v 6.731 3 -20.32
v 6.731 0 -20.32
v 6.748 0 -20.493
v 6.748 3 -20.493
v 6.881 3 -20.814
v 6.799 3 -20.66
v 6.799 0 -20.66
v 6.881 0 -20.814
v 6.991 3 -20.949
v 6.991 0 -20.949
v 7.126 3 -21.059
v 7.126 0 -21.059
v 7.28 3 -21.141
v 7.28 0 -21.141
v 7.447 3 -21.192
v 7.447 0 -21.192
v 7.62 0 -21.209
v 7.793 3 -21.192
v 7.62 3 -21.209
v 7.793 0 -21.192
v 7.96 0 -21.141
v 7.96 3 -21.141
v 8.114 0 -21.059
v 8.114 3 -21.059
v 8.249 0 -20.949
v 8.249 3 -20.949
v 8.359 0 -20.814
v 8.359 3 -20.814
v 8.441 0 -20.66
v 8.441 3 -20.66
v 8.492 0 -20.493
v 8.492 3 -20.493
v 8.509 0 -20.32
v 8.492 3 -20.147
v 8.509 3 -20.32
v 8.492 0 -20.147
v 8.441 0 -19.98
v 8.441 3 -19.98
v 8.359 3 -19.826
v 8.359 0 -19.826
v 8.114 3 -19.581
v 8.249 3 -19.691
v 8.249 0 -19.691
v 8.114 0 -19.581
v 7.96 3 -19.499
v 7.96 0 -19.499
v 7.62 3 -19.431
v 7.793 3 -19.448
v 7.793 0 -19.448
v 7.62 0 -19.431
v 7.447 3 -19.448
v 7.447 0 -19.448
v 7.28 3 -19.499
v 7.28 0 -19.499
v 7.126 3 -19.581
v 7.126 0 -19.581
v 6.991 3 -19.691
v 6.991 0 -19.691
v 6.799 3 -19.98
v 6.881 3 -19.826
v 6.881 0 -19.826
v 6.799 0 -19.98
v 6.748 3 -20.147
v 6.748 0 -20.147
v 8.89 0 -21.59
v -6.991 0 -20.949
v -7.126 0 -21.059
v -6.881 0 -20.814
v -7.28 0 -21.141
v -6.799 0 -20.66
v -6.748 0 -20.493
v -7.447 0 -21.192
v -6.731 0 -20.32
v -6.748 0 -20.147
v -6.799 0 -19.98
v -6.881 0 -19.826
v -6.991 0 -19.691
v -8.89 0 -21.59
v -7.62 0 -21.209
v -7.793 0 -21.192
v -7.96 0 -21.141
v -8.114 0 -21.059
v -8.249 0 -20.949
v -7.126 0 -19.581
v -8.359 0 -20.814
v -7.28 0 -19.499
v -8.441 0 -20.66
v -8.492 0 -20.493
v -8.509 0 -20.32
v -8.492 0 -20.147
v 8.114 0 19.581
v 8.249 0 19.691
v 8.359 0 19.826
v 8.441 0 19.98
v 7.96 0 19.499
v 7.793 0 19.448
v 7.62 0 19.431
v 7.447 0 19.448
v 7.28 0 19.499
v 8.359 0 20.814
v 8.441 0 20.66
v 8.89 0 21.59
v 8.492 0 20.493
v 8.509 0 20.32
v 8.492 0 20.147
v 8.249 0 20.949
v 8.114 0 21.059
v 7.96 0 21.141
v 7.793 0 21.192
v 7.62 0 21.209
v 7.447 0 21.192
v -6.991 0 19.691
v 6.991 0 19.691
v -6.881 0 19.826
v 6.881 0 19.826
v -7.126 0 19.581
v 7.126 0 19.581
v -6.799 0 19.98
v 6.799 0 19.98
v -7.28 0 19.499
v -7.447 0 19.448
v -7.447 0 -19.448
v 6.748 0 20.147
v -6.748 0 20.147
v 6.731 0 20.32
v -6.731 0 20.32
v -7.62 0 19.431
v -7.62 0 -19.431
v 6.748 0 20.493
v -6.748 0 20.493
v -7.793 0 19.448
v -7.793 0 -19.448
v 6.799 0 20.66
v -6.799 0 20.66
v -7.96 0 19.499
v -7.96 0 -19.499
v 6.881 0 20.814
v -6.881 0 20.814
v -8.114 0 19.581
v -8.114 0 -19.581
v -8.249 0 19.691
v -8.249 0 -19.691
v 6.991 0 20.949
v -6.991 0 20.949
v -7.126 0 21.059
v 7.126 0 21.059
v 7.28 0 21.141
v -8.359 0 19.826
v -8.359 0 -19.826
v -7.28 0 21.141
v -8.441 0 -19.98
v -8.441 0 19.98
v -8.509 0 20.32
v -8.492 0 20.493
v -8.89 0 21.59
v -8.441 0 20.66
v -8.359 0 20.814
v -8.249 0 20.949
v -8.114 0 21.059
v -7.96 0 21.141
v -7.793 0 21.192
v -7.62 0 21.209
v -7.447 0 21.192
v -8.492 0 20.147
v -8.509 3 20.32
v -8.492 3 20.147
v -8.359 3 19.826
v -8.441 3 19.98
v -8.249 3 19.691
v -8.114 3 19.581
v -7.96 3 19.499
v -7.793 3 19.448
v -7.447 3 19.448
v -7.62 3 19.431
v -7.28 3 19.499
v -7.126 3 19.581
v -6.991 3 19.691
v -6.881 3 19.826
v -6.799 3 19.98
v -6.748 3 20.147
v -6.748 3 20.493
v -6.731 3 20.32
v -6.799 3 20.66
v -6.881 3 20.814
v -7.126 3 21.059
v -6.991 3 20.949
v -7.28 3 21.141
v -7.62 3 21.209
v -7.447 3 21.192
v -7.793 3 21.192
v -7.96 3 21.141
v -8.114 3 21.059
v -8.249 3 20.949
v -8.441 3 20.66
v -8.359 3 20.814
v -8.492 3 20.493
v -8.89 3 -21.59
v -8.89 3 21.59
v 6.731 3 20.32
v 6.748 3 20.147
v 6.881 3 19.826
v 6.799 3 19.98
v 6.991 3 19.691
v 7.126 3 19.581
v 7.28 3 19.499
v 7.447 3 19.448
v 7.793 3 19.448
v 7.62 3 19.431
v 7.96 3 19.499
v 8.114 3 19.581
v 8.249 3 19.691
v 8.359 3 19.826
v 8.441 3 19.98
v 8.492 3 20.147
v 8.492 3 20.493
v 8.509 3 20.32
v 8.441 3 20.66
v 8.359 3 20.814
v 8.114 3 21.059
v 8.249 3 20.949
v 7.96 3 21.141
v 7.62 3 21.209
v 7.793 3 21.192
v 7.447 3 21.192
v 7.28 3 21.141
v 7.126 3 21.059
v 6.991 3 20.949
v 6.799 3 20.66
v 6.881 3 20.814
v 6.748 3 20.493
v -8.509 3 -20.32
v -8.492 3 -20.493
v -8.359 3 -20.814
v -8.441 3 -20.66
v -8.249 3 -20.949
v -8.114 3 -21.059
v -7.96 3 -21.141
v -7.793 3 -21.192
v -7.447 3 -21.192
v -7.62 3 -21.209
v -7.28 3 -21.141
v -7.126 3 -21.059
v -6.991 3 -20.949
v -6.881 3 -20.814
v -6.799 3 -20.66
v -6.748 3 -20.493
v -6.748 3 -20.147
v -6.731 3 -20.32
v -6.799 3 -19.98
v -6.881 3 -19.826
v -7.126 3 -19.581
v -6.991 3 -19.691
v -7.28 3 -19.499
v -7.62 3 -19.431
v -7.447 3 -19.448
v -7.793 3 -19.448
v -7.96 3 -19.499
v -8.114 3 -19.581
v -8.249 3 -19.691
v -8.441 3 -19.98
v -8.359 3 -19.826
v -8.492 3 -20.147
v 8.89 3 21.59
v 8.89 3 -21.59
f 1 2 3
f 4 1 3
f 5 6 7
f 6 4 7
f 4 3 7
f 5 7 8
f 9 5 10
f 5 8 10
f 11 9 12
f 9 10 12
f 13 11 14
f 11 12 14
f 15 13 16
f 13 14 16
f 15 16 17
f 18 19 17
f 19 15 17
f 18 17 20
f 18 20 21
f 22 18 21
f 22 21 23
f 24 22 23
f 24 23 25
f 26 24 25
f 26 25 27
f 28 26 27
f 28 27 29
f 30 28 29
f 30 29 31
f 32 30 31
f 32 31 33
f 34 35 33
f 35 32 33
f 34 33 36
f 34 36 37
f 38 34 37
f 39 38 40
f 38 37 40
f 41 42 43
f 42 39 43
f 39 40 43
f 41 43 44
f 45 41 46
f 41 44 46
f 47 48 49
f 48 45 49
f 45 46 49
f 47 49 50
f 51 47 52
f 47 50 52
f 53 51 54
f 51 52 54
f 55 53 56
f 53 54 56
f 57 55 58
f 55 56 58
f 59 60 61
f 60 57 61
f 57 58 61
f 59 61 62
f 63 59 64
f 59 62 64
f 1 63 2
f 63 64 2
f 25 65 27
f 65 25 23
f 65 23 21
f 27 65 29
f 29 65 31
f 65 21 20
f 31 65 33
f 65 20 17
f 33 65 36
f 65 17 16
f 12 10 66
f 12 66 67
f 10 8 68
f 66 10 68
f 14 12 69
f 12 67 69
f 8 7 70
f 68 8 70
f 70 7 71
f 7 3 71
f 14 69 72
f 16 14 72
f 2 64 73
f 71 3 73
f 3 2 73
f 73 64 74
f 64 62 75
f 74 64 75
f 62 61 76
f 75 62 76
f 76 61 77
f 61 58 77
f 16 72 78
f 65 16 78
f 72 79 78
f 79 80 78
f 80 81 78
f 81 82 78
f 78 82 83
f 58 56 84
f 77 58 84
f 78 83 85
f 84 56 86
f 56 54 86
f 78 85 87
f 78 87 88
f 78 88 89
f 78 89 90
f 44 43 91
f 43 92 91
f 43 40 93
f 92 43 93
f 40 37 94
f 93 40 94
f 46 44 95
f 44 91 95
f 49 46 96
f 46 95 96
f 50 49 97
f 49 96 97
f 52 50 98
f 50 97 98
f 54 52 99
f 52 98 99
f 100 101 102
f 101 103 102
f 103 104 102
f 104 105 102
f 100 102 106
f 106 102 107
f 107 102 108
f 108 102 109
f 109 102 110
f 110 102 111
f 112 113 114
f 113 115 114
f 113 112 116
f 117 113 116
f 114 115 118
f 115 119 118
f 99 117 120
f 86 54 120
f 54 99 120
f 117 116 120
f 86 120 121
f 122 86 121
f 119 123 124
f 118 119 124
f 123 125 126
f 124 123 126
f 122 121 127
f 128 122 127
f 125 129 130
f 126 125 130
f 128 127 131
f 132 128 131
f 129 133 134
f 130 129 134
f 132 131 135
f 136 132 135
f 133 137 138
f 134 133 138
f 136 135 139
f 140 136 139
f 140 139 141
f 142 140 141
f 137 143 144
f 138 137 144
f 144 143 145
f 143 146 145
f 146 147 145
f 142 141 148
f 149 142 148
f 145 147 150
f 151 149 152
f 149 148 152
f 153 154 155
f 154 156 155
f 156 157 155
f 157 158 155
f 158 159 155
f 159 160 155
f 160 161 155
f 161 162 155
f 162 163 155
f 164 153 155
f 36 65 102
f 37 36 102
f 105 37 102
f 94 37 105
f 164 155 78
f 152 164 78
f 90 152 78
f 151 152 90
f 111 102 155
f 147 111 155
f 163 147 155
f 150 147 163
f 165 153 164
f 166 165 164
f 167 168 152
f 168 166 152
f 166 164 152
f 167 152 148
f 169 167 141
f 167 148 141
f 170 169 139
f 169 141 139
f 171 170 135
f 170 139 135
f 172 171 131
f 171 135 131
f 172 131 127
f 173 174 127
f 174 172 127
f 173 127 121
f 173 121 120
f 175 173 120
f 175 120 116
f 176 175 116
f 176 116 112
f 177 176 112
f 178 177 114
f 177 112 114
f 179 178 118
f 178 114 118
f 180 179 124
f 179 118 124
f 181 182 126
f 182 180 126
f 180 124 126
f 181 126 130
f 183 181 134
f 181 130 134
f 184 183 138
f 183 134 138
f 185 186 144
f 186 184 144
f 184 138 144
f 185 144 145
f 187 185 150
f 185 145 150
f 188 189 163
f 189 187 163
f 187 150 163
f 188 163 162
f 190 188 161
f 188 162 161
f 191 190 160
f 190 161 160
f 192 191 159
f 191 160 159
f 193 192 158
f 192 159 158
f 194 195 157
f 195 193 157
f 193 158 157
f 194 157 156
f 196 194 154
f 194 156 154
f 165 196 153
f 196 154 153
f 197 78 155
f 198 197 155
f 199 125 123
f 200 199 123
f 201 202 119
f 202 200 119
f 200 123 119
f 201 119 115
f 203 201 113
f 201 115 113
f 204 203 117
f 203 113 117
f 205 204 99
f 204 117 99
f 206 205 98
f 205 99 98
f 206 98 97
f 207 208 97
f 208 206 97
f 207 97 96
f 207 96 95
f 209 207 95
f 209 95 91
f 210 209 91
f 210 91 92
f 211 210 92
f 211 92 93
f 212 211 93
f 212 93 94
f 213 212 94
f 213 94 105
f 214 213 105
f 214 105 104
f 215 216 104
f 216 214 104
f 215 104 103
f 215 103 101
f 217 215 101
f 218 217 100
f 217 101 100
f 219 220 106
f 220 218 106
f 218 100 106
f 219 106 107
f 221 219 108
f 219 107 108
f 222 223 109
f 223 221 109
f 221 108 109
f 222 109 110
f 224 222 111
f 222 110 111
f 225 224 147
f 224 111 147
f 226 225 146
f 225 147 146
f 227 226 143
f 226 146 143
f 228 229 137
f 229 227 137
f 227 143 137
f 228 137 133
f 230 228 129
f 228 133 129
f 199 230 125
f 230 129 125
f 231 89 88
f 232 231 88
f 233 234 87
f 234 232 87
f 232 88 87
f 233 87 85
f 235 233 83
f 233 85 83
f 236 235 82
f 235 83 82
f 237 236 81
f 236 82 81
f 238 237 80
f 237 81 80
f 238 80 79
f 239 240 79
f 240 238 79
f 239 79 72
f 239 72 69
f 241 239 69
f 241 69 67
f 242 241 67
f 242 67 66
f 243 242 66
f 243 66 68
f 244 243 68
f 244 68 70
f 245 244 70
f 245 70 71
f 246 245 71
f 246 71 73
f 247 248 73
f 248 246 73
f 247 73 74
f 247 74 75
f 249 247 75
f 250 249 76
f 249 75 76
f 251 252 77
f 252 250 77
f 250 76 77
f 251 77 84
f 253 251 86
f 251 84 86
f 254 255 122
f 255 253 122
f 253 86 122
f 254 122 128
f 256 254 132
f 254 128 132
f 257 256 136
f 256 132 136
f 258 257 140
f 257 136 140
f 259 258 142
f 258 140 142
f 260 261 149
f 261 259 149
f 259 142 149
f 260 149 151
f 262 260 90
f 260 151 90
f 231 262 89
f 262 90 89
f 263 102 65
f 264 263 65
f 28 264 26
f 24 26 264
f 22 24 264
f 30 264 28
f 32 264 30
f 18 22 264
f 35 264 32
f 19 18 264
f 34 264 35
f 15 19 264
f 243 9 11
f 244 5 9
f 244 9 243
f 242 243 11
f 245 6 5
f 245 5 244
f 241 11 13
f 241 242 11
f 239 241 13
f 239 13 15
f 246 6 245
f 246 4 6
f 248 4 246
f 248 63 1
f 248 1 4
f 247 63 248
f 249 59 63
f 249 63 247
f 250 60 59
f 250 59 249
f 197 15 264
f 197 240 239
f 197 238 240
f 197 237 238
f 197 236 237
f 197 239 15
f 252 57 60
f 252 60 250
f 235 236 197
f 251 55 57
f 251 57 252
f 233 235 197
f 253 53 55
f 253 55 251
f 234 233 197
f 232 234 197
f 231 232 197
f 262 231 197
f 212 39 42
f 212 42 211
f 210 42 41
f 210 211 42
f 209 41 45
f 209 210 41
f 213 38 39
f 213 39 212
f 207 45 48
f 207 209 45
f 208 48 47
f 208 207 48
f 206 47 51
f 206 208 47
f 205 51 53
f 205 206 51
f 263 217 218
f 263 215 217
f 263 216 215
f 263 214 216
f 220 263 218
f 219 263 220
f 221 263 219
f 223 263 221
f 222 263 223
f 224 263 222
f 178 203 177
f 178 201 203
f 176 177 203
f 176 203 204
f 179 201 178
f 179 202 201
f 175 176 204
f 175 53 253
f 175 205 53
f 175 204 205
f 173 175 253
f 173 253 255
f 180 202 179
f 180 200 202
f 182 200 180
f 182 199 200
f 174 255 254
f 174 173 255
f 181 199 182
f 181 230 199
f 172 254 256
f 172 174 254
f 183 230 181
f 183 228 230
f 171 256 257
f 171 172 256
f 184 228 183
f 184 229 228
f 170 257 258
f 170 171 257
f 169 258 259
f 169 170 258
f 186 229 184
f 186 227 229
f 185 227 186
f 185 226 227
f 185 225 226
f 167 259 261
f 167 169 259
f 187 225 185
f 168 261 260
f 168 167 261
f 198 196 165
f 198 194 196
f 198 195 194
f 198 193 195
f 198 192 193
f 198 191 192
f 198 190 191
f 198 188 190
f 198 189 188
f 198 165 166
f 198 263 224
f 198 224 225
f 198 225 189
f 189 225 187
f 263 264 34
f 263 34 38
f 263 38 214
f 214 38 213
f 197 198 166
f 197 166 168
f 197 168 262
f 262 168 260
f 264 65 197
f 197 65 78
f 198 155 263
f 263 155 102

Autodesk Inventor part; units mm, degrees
ref_plane "YZ Plane" through (0, 0, 0) normal (1, 0, 0) x (0, 1, 0)
ref_plane "XZ Plane" through (0, 0, 0) normal (0, 1, 0) x (-1, 0, 0)
ref_plane "XY Plane" through (0, 0, 0) normal (0, 0, 1) x (1, 0, 0)
sketch "Sketch1" plane through (0, 0, 0) normal (0, 1, 0) x (-1, 0, 0)
  line L0 (8.89, 21.59) -> (-8.89, 21.59)
  line L1 (-8.89, 21.59) -> (-8.89, -21.59)
  line L2 (-8.89, -21.59) -> (8.89, -21.59)
  line L3 (8.89, -21.59) -> (8.89, 21.59)
  circle A0 centre (7.62, 20.32) radius 0.889
  circle A1 centre (-7.62, 20.32) radius 0.889
  line L4 (8.89, 0) -> (-8.89, 0) construction
  circle A2 centre (7.62, -20.32) radius 0.889
  circle A3 centre (-7.62, -20.32) radius 0.889
  point P0 (0, 0)
  dimension "d0" = 17.78
  dimension "d1" = 43.18
  dimension "d2" = 21.59
  dimension "d3" = 8.89
  dimension "d4" = 15.24
  dimension "d5" = 7.62
  dimension "d6" = 1.778
  dimension "d7" = 1.778
  dimension "d8" = 1.27
  dimension "d9" = 1.27
  dimension "d10" = 1.27
  dimension "d11" = 40.64
  dimension "d12" = 13.462
  dimension "d15" = 15.24
extrude "Extrusion1" add sketch "Sketch1" along normal blind 3
equation "\"d2\" = 0.5 * d1"
equation "\"d3\" = 0.5 * d0"
equation "\"d5\" = 0.5 * d4"
equation "\"d9\" = d8"
properties part number "arduino nano screw ports"
